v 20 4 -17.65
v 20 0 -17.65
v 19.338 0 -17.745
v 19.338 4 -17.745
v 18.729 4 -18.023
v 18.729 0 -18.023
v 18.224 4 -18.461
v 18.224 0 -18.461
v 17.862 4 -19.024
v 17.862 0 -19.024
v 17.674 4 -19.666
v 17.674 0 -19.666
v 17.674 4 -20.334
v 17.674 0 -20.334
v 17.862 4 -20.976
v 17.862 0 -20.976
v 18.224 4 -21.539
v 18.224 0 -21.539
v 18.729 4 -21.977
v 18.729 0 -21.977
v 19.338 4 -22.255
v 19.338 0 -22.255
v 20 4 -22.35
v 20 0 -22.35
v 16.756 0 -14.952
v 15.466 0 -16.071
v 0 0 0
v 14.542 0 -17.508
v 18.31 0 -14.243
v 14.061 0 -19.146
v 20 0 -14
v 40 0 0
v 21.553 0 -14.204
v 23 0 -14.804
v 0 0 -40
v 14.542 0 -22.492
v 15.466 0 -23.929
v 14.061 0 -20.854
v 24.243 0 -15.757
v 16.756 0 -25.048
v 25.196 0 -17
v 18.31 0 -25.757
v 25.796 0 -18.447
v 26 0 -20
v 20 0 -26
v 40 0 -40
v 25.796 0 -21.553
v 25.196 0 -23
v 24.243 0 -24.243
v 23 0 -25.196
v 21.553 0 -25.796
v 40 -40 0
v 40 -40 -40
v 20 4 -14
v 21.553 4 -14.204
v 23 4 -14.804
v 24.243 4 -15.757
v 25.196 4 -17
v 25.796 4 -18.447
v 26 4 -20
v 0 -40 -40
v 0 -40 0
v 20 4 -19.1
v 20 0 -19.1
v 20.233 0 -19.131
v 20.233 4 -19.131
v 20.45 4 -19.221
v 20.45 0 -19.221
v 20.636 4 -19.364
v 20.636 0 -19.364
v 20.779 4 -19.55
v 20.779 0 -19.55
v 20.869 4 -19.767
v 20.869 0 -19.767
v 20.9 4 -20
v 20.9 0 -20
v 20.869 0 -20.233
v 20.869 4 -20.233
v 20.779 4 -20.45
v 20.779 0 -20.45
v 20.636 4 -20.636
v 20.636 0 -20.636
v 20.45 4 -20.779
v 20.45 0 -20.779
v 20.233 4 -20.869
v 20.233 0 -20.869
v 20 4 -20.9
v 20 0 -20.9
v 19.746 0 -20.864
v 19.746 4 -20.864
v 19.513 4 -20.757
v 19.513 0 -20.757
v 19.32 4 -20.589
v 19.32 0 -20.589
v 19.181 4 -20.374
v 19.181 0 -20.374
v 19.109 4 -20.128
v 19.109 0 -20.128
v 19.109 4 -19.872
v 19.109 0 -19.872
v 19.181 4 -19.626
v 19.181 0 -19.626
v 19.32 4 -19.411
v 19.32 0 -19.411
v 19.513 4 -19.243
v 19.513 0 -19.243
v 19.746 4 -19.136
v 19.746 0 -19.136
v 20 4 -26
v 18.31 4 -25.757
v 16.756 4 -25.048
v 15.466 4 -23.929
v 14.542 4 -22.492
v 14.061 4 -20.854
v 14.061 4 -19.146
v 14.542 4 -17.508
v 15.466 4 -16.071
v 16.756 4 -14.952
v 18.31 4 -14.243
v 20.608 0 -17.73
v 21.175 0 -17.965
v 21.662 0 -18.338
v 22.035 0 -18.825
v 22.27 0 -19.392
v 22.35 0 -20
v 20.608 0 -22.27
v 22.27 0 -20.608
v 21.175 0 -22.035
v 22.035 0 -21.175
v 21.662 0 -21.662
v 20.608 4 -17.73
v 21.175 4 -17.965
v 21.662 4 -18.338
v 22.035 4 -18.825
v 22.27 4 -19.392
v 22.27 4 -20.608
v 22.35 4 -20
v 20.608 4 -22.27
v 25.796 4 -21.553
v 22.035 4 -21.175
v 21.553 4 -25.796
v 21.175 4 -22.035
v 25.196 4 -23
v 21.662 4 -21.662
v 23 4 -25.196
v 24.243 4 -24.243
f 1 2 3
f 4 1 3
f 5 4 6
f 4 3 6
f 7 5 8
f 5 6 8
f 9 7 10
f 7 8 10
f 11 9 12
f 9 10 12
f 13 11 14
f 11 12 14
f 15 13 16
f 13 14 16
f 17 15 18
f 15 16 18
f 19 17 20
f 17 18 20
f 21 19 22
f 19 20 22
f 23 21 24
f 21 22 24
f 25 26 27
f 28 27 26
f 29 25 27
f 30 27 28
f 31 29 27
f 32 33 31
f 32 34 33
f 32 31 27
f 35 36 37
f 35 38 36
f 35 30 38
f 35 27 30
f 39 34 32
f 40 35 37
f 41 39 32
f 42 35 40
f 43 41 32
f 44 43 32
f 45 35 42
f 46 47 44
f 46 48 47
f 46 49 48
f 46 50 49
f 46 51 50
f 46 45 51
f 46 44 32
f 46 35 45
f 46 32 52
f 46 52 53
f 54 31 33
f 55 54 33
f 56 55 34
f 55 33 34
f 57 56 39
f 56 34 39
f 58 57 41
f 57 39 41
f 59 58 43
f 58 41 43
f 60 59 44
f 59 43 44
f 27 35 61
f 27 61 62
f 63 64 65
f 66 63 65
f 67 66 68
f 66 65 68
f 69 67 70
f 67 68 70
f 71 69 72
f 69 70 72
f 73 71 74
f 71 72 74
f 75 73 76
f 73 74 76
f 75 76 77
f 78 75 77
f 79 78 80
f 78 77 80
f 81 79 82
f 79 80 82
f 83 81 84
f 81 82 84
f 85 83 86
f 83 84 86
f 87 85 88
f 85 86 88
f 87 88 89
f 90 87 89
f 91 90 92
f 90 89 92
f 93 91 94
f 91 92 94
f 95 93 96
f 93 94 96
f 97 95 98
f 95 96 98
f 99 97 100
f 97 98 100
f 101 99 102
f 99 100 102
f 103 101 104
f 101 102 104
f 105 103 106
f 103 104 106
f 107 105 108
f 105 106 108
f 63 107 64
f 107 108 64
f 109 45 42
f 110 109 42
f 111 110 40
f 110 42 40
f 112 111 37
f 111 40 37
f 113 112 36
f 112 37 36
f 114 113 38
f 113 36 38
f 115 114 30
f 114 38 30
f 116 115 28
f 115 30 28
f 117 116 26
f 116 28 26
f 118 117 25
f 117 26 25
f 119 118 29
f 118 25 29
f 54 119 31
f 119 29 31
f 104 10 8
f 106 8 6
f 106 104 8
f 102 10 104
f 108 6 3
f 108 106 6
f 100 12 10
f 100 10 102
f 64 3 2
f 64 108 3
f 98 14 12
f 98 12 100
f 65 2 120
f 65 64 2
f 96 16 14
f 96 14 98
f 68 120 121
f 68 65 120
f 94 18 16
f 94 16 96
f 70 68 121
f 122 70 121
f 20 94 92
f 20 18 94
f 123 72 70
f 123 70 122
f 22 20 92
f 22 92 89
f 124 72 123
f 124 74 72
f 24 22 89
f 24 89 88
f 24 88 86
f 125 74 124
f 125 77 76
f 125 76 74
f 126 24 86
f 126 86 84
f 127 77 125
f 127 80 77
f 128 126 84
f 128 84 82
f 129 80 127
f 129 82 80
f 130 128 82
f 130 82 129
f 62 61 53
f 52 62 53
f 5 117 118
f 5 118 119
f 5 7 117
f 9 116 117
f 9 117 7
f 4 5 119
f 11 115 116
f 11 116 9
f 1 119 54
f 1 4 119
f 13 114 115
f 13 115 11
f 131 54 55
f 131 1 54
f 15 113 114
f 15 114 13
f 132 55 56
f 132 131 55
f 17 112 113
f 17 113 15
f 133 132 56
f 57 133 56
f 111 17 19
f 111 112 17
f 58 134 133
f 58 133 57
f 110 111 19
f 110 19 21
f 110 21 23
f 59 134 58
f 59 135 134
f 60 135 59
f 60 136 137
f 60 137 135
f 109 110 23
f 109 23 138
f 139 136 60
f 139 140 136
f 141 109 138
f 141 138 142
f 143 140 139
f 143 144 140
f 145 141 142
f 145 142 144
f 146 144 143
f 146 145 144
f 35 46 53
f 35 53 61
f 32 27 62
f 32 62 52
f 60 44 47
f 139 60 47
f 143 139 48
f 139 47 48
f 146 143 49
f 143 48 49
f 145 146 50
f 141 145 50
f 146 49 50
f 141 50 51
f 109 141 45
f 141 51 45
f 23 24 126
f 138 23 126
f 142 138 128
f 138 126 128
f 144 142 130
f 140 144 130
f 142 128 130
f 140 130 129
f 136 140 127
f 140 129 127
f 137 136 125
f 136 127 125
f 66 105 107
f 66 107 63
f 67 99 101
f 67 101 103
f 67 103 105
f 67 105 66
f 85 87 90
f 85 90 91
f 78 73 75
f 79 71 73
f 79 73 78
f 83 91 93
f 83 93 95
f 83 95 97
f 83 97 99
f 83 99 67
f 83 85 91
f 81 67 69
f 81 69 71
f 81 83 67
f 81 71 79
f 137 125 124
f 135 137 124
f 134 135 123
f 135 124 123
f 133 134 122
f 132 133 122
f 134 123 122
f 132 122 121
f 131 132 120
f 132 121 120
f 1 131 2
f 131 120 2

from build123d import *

# Parameters (mm, degrees)
SKETCH_1_W      = 40
SKETCH_1_H      = 40
EXTRUDE_1_DEPTH = 40
SKETCH_1_3_R    = 6
SKETCH_1_3_R_2  = 2.35
SKETCH_1_3_R_3  = 0.9
EXTRUDE_2_DEPTH = 4


with BuildPart() as part:
    # 草图1 → 凸台-拉伸1 (new body)
    with BuildSketch(Plane(origin=(0, 0, 0), x_dir=(1, 0, 0), z_dir=(0, 1, 0))):
        with Locations((20, 20)):
            Rectangle(SKETCH_1_W, SKETCH_1_H)
    extrude(amount=-EXTRUDE_1_DEPTH)

    # 草图1<3> → 凸台-拉伸2 (add)
    # profile 1 of 2: a face of its own
    with BuildSketch(Plane(origin=(0, 0, 0), x_dir=(1, 0, 0), z_dir=(0, 1, 0))):
        with Locations((20, 20)):
            Circle(SKETCH_1_3_R)
        with Locations((20, 20)):
            Circle(SKETCH_1_3_R_2, mode=Mode.SUBTRACT)
    # profile 2 of 2: a face of its own
    with BuildSketch(Plane(origin=(0, 0, 0), x_dir=(1, 0, 0), z_dir=(0, 1, 0))):
        with Locations((20, 20)):
            Circle(SKETCH_1_3_R_3)
    extrude(amount=EXTRUDE_2_DEPTH)


solid = part.part
